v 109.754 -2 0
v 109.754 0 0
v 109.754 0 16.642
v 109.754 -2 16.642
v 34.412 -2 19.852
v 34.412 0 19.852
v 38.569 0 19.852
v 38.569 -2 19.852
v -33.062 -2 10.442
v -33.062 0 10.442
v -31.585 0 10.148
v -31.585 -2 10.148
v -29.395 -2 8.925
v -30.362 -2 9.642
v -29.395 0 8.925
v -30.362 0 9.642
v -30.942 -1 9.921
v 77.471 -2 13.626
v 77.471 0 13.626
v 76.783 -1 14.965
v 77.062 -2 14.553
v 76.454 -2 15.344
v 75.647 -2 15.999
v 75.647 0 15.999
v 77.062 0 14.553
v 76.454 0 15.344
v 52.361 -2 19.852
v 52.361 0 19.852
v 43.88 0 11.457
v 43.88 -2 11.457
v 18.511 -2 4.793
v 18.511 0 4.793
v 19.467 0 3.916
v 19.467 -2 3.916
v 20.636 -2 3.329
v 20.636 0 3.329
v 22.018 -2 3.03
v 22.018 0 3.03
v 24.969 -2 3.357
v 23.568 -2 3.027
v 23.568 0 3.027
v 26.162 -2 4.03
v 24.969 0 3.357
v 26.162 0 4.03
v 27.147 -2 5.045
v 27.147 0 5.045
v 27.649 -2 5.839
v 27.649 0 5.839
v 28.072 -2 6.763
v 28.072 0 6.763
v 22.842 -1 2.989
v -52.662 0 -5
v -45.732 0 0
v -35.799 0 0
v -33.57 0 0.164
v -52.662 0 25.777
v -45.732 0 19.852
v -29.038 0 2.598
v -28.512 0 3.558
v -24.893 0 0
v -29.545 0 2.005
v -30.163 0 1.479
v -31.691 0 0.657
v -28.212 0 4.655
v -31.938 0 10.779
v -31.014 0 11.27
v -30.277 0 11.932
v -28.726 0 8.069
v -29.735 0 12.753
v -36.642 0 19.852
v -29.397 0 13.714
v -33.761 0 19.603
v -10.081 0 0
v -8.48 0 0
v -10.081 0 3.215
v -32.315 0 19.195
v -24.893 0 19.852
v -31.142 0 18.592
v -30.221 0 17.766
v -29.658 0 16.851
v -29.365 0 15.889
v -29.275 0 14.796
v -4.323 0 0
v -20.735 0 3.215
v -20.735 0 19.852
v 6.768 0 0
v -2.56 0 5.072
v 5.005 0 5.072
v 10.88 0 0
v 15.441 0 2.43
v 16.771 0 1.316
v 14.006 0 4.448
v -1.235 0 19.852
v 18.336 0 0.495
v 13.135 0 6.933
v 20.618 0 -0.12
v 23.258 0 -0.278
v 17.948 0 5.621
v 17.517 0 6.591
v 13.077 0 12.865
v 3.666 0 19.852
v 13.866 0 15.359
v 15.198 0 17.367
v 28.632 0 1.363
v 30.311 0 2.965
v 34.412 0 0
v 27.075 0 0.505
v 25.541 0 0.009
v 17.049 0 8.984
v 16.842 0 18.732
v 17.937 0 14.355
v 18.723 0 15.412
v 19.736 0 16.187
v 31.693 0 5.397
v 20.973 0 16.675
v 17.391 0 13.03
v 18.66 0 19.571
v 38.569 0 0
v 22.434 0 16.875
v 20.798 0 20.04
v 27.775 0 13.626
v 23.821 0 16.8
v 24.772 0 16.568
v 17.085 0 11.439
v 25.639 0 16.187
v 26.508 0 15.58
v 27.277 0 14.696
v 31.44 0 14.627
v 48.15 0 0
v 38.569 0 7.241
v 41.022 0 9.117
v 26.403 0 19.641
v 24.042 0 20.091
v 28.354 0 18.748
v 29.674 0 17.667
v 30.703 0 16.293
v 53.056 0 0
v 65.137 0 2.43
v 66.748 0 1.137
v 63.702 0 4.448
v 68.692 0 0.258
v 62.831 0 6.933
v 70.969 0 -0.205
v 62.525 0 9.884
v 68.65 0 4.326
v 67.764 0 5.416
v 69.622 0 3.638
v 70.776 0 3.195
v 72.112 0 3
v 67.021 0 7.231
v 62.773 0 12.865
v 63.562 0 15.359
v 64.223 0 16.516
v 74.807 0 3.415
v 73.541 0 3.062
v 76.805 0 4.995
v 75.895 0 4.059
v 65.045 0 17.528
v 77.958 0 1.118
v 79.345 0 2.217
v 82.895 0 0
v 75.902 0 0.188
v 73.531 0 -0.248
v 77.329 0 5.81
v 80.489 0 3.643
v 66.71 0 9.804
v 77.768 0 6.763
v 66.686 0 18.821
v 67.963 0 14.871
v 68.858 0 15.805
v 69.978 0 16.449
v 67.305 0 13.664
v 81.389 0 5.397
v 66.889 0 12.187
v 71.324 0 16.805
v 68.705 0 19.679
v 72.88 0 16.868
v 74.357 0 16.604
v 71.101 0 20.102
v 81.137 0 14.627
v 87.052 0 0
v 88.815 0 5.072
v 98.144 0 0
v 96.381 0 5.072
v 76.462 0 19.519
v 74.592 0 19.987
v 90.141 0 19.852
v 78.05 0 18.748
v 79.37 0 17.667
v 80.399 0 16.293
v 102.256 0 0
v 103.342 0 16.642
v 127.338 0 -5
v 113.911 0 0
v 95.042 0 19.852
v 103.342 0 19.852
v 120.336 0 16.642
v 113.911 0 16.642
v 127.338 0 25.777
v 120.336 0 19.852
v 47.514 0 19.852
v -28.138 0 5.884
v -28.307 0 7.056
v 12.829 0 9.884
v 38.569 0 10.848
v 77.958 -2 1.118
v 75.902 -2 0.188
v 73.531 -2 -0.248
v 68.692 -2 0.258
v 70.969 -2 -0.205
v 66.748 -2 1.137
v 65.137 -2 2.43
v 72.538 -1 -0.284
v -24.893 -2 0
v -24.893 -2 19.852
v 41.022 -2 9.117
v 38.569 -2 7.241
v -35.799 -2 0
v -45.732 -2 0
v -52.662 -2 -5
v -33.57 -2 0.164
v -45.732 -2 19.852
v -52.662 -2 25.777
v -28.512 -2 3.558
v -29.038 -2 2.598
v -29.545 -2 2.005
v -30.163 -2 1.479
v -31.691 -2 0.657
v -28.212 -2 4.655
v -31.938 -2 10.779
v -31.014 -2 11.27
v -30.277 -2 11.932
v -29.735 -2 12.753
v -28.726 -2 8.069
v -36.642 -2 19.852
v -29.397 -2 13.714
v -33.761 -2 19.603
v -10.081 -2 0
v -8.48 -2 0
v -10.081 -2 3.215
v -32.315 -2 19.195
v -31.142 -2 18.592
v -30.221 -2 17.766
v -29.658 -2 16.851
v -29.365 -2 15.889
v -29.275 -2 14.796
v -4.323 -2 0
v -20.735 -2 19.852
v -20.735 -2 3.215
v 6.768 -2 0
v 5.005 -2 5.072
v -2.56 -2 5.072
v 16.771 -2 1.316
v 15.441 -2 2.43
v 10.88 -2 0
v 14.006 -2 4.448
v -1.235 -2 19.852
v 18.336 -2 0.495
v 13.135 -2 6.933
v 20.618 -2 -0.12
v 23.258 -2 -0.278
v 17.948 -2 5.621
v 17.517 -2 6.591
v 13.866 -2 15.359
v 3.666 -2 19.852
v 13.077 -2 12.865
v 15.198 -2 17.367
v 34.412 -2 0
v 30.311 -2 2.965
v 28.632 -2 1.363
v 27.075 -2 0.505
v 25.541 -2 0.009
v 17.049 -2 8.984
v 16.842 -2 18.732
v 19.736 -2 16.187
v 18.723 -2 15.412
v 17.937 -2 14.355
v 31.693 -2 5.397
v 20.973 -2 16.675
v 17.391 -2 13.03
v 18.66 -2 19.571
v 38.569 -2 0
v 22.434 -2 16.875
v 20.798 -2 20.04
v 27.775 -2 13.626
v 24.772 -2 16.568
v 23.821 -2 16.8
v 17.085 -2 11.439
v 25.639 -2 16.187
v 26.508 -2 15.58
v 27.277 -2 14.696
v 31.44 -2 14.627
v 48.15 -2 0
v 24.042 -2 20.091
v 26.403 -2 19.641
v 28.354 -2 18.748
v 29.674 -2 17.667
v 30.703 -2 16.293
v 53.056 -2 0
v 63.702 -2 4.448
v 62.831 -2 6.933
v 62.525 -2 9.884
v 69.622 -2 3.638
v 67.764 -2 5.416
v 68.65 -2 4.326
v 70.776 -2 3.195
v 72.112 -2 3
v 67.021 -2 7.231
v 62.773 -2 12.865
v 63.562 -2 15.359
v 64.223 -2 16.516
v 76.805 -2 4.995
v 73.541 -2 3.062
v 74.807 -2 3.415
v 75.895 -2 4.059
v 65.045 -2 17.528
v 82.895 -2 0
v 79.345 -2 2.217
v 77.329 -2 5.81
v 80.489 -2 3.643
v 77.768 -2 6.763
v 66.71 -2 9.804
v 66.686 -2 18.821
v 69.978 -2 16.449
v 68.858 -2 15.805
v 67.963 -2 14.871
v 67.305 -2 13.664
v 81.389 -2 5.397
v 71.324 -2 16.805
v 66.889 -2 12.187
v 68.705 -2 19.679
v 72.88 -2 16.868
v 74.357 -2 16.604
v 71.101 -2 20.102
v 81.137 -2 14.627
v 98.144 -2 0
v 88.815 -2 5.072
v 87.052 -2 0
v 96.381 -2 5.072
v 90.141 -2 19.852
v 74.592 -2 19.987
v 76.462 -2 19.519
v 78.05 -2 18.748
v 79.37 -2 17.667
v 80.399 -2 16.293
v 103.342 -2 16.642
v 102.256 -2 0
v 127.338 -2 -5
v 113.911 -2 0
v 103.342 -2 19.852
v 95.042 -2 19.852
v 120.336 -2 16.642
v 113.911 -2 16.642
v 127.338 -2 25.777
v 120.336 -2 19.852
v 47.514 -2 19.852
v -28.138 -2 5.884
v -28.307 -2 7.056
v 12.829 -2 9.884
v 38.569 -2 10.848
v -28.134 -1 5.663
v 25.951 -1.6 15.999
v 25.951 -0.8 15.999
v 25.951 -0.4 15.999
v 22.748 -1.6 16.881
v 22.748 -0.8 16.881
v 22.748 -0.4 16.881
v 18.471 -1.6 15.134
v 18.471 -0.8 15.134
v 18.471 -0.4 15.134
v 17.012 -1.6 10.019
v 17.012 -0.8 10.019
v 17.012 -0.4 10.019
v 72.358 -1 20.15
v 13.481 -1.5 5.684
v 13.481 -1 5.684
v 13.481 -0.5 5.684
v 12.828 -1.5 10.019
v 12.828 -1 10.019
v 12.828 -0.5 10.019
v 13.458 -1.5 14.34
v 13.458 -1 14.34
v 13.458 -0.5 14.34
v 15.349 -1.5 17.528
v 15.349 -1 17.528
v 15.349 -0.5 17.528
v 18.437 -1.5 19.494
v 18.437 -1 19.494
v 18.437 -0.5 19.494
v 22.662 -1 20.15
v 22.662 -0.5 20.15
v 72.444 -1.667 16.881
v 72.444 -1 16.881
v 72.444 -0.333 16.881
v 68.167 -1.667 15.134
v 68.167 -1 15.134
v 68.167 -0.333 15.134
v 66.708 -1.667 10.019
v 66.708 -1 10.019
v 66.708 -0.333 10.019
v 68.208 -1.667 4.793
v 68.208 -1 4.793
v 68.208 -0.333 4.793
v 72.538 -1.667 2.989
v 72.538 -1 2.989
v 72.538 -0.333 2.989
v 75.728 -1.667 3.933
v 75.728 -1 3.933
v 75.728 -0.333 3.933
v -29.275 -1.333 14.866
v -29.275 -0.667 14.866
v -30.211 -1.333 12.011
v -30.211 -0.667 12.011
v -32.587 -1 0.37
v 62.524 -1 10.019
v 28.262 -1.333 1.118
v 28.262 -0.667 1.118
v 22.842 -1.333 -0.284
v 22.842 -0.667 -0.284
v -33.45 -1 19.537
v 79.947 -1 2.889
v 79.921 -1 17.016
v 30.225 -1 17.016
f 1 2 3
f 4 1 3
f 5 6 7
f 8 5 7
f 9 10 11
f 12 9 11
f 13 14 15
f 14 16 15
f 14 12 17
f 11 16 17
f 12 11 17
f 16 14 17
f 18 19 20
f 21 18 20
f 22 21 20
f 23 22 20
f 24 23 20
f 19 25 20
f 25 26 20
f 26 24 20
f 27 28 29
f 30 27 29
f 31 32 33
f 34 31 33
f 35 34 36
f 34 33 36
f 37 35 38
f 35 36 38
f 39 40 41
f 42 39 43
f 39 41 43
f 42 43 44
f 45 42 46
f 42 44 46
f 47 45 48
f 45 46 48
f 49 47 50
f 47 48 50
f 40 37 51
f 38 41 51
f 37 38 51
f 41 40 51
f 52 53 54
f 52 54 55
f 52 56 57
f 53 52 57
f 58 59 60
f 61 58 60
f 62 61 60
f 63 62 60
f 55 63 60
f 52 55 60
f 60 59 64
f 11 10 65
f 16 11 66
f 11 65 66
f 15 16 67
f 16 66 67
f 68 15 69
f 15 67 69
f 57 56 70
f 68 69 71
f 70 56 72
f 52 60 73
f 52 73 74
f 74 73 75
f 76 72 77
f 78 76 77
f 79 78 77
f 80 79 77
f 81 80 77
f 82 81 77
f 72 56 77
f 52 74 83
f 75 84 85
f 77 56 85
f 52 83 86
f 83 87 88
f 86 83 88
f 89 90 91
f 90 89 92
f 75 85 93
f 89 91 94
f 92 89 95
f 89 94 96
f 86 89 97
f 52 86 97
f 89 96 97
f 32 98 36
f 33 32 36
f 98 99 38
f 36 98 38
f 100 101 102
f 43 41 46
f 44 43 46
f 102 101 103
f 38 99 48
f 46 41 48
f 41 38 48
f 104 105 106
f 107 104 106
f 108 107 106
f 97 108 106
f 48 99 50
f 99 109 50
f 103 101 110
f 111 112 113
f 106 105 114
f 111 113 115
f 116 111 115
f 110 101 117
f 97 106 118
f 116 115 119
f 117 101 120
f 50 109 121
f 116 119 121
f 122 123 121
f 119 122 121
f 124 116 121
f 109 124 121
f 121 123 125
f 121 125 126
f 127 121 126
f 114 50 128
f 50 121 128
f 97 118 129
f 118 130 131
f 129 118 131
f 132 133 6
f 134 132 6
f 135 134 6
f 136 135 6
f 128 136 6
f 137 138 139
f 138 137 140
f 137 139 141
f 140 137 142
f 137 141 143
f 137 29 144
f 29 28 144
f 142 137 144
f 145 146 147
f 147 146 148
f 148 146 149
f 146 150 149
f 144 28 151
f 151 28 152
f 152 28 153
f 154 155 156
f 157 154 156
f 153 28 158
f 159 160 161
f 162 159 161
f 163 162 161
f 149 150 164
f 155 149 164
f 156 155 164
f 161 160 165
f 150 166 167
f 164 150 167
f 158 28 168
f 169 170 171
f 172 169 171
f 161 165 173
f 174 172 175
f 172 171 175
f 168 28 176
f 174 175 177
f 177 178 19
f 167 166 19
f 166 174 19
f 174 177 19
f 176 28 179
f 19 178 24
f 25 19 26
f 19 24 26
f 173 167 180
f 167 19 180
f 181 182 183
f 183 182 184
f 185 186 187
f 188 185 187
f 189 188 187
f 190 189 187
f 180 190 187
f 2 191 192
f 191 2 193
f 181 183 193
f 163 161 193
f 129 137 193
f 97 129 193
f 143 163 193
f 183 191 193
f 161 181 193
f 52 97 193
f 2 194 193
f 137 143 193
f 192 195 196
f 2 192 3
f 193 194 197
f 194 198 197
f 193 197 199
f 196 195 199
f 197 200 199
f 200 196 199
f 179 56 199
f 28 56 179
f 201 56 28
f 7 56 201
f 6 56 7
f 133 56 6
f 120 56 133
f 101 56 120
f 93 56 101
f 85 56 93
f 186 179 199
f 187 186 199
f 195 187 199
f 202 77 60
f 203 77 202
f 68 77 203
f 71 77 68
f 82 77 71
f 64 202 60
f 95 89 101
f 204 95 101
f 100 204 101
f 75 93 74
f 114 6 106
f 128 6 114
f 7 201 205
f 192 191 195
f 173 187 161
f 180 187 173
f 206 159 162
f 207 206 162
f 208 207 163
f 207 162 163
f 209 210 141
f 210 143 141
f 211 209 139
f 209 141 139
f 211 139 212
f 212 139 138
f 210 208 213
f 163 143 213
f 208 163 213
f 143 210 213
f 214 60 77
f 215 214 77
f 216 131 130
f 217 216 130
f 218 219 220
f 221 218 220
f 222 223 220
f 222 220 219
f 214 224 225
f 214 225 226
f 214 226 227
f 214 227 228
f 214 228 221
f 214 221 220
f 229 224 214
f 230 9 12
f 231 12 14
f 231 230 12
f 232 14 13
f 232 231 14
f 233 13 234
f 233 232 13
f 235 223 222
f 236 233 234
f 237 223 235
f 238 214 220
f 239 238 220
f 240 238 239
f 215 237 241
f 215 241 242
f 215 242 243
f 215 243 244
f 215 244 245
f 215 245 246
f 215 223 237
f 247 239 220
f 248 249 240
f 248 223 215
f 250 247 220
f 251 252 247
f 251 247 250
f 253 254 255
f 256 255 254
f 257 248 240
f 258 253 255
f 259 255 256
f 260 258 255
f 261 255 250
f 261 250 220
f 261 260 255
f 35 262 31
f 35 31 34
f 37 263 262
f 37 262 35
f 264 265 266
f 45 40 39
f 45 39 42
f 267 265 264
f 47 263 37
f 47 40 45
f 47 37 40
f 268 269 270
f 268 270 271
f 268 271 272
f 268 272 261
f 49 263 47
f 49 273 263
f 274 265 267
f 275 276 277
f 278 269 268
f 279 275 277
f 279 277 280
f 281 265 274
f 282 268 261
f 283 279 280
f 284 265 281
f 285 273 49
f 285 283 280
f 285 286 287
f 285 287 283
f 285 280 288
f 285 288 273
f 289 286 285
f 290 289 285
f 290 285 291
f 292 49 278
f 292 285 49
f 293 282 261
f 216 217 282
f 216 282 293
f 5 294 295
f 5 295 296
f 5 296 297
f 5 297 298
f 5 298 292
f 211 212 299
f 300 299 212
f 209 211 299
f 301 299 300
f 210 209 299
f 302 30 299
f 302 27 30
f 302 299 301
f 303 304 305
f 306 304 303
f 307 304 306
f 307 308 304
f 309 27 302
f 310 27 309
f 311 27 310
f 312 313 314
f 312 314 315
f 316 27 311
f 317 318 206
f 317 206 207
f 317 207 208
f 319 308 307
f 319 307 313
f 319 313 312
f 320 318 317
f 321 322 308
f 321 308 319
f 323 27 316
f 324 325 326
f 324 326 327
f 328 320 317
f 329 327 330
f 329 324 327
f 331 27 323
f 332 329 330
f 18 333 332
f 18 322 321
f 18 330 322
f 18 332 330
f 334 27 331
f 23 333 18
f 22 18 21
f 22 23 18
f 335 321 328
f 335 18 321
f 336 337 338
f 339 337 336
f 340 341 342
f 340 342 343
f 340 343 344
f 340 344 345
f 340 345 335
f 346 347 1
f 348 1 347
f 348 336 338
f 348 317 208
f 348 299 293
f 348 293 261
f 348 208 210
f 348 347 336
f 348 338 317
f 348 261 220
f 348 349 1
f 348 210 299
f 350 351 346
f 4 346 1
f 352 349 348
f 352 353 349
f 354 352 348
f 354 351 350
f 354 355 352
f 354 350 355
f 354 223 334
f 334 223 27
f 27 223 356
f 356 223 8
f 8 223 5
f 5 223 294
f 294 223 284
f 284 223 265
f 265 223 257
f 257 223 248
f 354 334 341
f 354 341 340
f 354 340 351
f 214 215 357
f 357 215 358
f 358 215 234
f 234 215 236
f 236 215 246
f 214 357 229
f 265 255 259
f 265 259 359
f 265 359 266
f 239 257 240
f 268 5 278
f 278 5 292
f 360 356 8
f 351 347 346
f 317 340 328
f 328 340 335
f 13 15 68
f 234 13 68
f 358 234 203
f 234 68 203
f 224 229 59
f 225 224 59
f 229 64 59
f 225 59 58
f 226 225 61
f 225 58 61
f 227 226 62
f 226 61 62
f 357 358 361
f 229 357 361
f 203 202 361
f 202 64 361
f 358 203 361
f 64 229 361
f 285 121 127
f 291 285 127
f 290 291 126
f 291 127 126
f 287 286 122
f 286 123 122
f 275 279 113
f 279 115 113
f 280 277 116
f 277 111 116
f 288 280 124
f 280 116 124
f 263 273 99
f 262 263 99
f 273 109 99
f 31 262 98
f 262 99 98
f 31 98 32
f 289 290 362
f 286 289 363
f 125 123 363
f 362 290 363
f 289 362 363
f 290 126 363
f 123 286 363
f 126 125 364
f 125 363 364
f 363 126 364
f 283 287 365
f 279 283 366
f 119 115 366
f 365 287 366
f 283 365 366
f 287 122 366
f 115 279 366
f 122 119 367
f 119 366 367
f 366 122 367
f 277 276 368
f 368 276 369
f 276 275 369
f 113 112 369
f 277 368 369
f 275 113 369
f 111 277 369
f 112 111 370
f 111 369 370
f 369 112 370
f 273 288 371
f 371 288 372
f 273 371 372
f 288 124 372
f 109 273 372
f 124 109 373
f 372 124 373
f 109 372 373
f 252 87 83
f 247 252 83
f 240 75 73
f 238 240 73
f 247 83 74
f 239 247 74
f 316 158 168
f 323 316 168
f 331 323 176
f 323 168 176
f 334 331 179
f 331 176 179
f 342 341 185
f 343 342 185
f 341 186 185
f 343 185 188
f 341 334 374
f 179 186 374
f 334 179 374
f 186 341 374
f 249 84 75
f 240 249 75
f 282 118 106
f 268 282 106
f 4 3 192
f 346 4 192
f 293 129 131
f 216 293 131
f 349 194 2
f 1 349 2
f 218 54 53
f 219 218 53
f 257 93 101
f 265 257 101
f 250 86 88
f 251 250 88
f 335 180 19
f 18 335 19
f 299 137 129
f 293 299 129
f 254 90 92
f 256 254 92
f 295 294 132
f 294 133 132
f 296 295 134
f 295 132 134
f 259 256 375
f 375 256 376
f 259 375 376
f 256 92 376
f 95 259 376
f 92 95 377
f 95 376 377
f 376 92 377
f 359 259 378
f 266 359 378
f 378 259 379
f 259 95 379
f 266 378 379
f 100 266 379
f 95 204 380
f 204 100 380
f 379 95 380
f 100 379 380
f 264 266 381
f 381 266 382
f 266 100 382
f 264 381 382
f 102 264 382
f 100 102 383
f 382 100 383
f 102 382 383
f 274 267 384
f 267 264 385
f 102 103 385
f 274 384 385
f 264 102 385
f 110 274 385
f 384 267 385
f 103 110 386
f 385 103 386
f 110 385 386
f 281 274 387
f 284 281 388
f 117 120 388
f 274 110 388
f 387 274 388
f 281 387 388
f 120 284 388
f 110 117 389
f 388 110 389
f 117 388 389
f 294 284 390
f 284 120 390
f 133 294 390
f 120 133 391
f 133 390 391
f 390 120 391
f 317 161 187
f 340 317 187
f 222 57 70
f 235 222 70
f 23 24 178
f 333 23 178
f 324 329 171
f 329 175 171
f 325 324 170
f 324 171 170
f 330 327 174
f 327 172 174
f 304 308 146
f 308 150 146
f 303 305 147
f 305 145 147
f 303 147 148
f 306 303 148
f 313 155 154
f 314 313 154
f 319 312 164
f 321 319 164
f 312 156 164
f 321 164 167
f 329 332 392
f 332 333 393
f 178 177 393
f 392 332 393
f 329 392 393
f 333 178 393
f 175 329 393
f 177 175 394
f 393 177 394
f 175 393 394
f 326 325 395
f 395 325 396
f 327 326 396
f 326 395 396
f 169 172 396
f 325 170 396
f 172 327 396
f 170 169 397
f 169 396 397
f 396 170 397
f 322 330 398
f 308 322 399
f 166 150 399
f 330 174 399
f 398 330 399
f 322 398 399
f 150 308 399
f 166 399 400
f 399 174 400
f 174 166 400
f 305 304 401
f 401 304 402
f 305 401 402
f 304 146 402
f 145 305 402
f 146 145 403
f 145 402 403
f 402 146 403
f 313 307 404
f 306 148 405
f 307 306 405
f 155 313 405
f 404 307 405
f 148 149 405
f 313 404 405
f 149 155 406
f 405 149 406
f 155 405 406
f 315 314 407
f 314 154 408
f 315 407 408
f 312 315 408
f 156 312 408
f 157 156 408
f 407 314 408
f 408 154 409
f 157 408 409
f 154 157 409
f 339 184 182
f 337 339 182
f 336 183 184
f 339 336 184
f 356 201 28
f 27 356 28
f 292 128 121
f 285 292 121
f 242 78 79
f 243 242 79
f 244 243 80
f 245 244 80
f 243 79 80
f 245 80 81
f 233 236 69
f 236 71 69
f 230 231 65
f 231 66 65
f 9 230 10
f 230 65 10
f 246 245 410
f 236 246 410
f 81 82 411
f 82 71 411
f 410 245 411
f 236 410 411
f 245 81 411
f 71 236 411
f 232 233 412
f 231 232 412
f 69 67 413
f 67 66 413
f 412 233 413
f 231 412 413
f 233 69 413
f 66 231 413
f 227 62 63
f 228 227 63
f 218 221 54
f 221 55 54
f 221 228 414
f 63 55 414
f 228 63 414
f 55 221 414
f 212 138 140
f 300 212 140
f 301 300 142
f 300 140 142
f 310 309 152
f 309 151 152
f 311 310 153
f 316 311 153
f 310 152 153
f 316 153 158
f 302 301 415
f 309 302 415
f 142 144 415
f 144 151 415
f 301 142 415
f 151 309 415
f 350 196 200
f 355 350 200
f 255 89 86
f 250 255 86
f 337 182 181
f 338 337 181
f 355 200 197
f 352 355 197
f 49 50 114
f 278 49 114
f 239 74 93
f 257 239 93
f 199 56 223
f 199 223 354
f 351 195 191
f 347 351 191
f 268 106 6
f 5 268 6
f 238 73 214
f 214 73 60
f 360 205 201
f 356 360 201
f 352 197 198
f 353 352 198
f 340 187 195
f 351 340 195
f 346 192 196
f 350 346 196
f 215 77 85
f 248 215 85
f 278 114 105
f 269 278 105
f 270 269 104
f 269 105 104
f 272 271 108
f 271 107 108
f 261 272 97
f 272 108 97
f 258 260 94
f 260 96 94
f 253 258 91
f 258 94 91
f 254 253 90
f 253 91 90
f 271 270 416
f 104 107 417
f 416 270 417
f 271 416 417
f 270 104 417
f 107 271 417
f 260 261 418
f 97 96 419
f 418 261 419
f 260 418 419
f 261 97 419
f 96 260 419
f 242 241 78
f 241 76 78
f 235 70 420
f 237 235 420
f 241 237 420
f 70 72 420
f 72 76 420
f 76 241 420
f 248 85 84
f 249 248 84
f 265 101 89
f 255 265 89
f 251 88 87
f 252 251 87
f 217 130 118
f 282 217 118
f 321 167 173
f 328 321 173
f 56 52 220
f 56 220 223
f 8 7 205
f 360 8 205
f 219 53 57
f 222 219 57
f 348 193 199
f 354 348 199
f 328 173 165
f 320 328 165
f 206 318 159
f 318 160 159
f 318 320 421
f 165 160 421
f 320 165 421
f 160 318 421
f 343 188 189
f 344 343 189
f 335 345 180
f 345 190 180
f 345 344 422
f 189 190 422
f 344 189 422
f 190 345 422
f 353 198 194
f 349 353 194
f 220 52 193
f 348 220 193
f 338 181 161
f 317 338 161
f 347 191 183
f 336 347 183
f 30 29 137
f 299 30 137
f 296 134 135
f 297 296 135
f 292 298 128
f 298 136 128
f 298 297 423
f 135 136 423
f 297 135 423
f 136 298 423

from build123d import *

# Parameters (mm, degrees)
F0_W     = 180
F0_H     = 30.7765754297
F1_DEPTH = 2


with BuildPart() as f1:
    # F0 (on Front) → F1 (new body)
    with BuildSketch(Plane.XZ):
        with Locations((37.3380143768, 10.3882877148)):
            Rectangle(F0_W, F0_H)
        with BuildLine():
            add(Edge.make_bspline(
                [(-29.3945604163, 8.9251803522), (-28.1343492982, 7.6920220666), (-28.1343492982, 5.6630596223)],
                knots=[0, 0, 0, 1, 1, 1], degree=2))
            add(Edge.make_bspline(
                [(-28.1343492982, 5.6630596223), (-28.1343492982, 2.9577763633), (-30.1633117425, 1.4788881816)],
                knots=[0, 0, 0, 1, 1, 1], degree=2))
            add(Edge.make_bspline(
                [(-30.1633117425, 1.4788881816), (-32.1922741868, 0), (-35.7993185322, 0)],
                knots=[0, 0, 0, 1, 1, 1], degree=2))
            Line((-35.7993185322, 0), (-45.7322168984, 0))
            Line((-45.7322168984, 0), (-45.7322168984, 19.8522703161))
            Line((-45.7322168984, 19.8522703161), (-36.6424651479, 19.8522703161))
            add(Edge.make_bspline(
                [(-36.6424651479, 19.8522703161), (-33.0083679699, 19.8522703161), (-31.1417225212, 18.592059198)],
                knots=[0, 0, 0, 1, 1, 1], degree=2))
            add(Edge.make_bspline(
                [(-31.1417225212, 18.592059198), (-29.2750770724, 17.3318480798), (-29.2750770724, 14.8655315086)],
                knots=[0, 0, 0, 1, 1, 1], degree=2))
            add(Edge.make_bspline(
                [(-29.2750770724, 14.8655315086), (-29.2750770724, 13.1747294717), (-30.2106541995, 12.0114576703)],
                knots=[0, 0, 0, 1, 1, 1], degree=2))
            add(Edge.make_bspline(
                [(-30.2106541995, 12.0114576703), (-31.1462313266, 10.8481858689), (-33.0624736351, 10.44239338)],
                knots=[0, 0, 0, 1, 1, 1], degree=2))
            add(Edge.make_bspline(
                [(-33.0624736351, 10.44239338), (-30.6547715345, 10.1583386378), (-29.3945604163, 8.9251803522)],
                knots=[0, 0, 0, 1, 1, 1], degree=2))
        make_face(mode=Mode.SUBTRACT)
        Polygon((-10.0810923493, 0), (-24.8925181927, 0), (-24.8925181927, 19.8522703161), (-20.7353995846, 19.8522703161), (-20.7353995846, 3.2147782729), (-10.0810923493, 3.2147782729), align=None, mode=Mode.SUBTRACT)
        Polygon((10.8803441031, 0), (6.7683135493, 0), (5.0053706255, 5.0724061108), (-2.5604048891, 5.0724061108), (-4.3233478129, 0), (-8.480466421, 0), (-1.2348160921, 19.8522703161), (3.6662554122, 19.8522703161), align=None, mode=Mode.SUBTRACT)
        with BuildLine():
            add(Edge.make_bspline(
                [(18.5114972964, 4.792860174), (20.0106751024, 2.9893380013), (22.8422049136, 2.9893380013)],
                knots=[0, 0, 0, 1, 1, 1], degree=2))
            add(Edge.make_bspline(
                [(22.8422049136, 2.9893380013), (26.6070574491, 2.9893380013), (28.0724192145, 6.7632081477)],
                knots=[0, 0, 0, 1, 1, 1], degree=2))
            Line((28.0724192145, 6.7632081477), (31.6929899762, 5.3970401018))
            add(Edge.make_bspline(
                [(31.6929899762, 5.3970401018), (30.5252093694, 2.5204222364), (28.2617890426, 1.1181837471)],
                knots=[0, 0, 0, 1, 1, 1], degree=2))
            add(Edge.make_bspline(
                [(28.2617890426, 1.1181837471), (25.9983687158, -0.2840547422), (22.8422049136, -0.2840547422)],
                knots=[0, 0, 0, 1, 1, 1], degree=2))
            add(Edge.make_bspline(
                [(22.8422049136, -0.2840547422), (18.053853545, -0.2840547422), (15.4410007973, 2.4302461277)],
                knots=[0, 0, 0, 1, 1, 1], degree=2))
            add(Edge.make_bspline(
                [(15.4410007973, 2.4302461277), (12.8281480496, 5.1445469977), (12.8281480496, 10.0185656694)],
                knots=[0, 0, 0, 1, 1, 1], degree=2))
            add(Edge.make_bspline(
                [(12.8281480496, 10.0185656694), (12.8281480496, 14.9061107575), (15.348570286, 17.5279811161)],
                knots=[0, 0, 0, 1, 1, 1], degree=2))
            add(Edge.make_bspline(
                [(15.348570286, 17.5279811161), (17.8689925223, 20.1498514746), (22.6618526963, 20.1498514746)],
                knots=[0, 0, 0, 1, 1, 1], degree=2))
            add(Edge.make_bspline(
                [(22.6618526963, 20.1498514746), (26.156176906, 20.1498514746), (28.3542195539, 18.7476129854)],
                knots=[0, 0, 0, 1, 1, 1], degree=2))
            add(Edge.make_bspline(
                [(28.3542195539, 18.7476129854), (30.5522622019, 17.3453744961), (31.440496872, 14.6265648207)],
                knots=[0, 0, 0, 1, 1, 1], degree=2))
            Line((31.440496872, 14.6265648207), (27.774838056, 13.6256100149))
            add(Edge.make_bspline(
                [(27.774838056, 13.6256100149), (27.3104310965, 15.1180246128), (25.9510262588, 15.9994960747)],
                knots=[0, 0, 0, 1, 1, 1], degree=2))
            add(Edge.make_bspline(
                [(25.9510262588, 15.9994960747), (24.5916214211, 16.8809675366), (22.7475199995, 16.8809675366)],
                knots=[0, 0, 0, 1, 1, 1], degree=2))
            add(Edge.make_bspline(
                [(22.7475199995, 16.8809675366), (19.9295166047, 16.8809675366), (18.4709180475, 15.1338054318)],
                knots=[0, 0, 0, 1, 1, 1], degree=2))
            add(Edge.make_bspline(
                [(18.4709180475, 15.1338054318), (17.0123194903, 13.386643327), (17.0123194903, 10.0185656694)],
                knots=[0, 0, 0, 1, 1, 1], degree=2))
            add(Edge.make_bspline(
                [(17.0123194903, 10.0185656694), (17.0123194903, 6.5963823467), (18.5114972964, 4.792860174)],
                knots=[0, 0, 0, 1, 1, 1], degree=2))
        make_face(mode=Mode.SUBTRACT)
        Polygon((53.055710112, 0), (48.1501298022, 0), (41.0217084145, 9.1168045831), (38.5689182597, 7.2411415234), (38.5689182597, 0), (34.4117996515, 0), (34.4117996515, 19.8522703161), (38.5689182597, 19.8522703161), (38.5689182597, 10.8481858689), (47.5143882363, 19.8522703161), (52.3613540755, 19.8522703161), (43.8802910583, 11.4568746022), align=None, mode=Mode.SUBTRACT)
        with BuildLine():
            add(Edge.make_bspline(
                [(68.2075507655, 4.792860174), (69.7067285716, 2.9893380013), (72.5382583827, 2.9893380013)],
                knots=[0, 0, 0, 1, 1, 1], degree=2))
            add(Edge.make_bspline(
                [(72.5382583827, 2.9893380013), (76.3031109183, 2.9893380013), (77.7684726836, 6.7632081477)],
                knots=[0, 0, 0, 1, 1, 1], degree=2))
            Line((77.7684726836, 6.7632081477), (81.3890434453, 5.3970401018))
            add(Edge.make_bspline(
                [(81.3890434453, 5.3970401018), (80.2212628385, 2.5204222364), (77.9578425117, 1.1181837471)],
                knots=[0, 0, 0, 1, 1, 1], degree=2))
            add(Edge.make_bspline(
                [(77.9578425117, 1.1181837471), (75.694422185, -0.2840547422), (72.5382583827, -0.2840547422)],
                knots=[0, 0, 0, 1, 1, 1], degree=2))
            add(Edge.make_bspline(
                [(72.5382583827, -0.2840547422), (67.7499070142, -0.2840547422), (65.1370542664, 2.4302461277)],
                knots=[0, 0, 0, 1, 1, 1], degree=2))
            add(Edge.make_bspline(
                [(65.1370542664, 2.4302461277), (62.5242015187, 5.1445469977), (62.5242015187, 10.0185656694)],
                knots=[0, 0, 0, 1, 1, 1], degree=2))
            add(Edge.make_bspline(
                [(62.5242015187, 10.0185656694), (62.5242015187, 14.9061107575), (65.0446237551, 17.5279811161)],
                knots=[0, 0, 0, 1, 1, 1], degree=2))
            add(Edge.make_bspline(
                [(65.0446237551, 17.5279811161), (67.5650459915, 20.1498514746), (72.3579061654, 20.1498514746)],
                knots=[0, 0, 0, 1, 1, 1], degree=2))
            add(Edge.make_bspline(
                [(72.3579061654, 20.1498514746), (75.8522303751, 20.1498514746), (78.0502730231, 18.7476129854)],
                knots=[0, 0, 0, 1, 1, 1], degree=2))
            add(Edge.make_bspline(
                [(78.0502730231, 18.7476129854), (80.2483156711, 17.3453744961), (81.1365503411, 14.6265648207)],
                knots=[0, 0, 0, 1, 1, 1], degree=2))
            Line((81.1365503411, 14.6265648207), (77.4708915251, 13.6256100149))
            add(Edge.make_bspline(
                [(77.4708915251, 13.6256100149), (77.0064845656, 15.1180246128), (75.6470797279, 15.9994960747)],
                knots=[0, 0, 0, 1, 1, 1], degree=2))
            add(Edge.make_bspline(
                [(75.6470797279, 15.9994960747), (74.2876748903, 16.8809675366), (72.4435734687, 16.8809675366)],
                knots=[0, 0, 0, 1, 1, 1], degree=2))
            add(Edge.make_bspline(
                [(72.4435734687, 16.8809675366), (69.6255700738, 16.8809675366), (68.1669715166, 15.1338054318)],
                knots=[0, 0, 0, 1, 1, 1], degree=2))
            add(Edge.make_bspline(
                [(68.1669715166, 15.1338054318), (66.7083729594, 13.386643327), (66.7083729594, 10.0185656694)],
                knots=[0, 0, 0, 1, 1, 1], degree=2))
            add(Edge.make_bspline(
                [(66.7083729594, 10.0185656694), (66.7083729594, 6.5963823467), (68.2075507655, 4.792860174)],
                knots=[0, 0, 0, 1, 1, 1], degree=2))
        make_face(mode=Mode.SUBTRACT)
        Polygon((102.2557949836, 0), (98.1437644298, 0), (96.380821506, 5.0724061108), (88.8150459915, 5.0724061108), (87.0521030676, 0), (82.8949844595, 0), (90.1406347884, 19.8522703161), (95.0417062928, 19.8522703161), align=None, mode=Mode.SUBTRACT)
        Polygon((120.3361047651, 16.6420008487), (113.9110570248, 16.6420008487), (113.9110570248, 0), (109.7539384167, 0), (109.7539384167, 16.6420008487), (103.3424170927, 16.6420008487), (103.3424170927, 19.8522703161), (120.3361047651, 19.8522703161), align=None, mode=Mode.SUBTRACT)
    extrude(amount=F1_DEPTH)


solid = f1.part
